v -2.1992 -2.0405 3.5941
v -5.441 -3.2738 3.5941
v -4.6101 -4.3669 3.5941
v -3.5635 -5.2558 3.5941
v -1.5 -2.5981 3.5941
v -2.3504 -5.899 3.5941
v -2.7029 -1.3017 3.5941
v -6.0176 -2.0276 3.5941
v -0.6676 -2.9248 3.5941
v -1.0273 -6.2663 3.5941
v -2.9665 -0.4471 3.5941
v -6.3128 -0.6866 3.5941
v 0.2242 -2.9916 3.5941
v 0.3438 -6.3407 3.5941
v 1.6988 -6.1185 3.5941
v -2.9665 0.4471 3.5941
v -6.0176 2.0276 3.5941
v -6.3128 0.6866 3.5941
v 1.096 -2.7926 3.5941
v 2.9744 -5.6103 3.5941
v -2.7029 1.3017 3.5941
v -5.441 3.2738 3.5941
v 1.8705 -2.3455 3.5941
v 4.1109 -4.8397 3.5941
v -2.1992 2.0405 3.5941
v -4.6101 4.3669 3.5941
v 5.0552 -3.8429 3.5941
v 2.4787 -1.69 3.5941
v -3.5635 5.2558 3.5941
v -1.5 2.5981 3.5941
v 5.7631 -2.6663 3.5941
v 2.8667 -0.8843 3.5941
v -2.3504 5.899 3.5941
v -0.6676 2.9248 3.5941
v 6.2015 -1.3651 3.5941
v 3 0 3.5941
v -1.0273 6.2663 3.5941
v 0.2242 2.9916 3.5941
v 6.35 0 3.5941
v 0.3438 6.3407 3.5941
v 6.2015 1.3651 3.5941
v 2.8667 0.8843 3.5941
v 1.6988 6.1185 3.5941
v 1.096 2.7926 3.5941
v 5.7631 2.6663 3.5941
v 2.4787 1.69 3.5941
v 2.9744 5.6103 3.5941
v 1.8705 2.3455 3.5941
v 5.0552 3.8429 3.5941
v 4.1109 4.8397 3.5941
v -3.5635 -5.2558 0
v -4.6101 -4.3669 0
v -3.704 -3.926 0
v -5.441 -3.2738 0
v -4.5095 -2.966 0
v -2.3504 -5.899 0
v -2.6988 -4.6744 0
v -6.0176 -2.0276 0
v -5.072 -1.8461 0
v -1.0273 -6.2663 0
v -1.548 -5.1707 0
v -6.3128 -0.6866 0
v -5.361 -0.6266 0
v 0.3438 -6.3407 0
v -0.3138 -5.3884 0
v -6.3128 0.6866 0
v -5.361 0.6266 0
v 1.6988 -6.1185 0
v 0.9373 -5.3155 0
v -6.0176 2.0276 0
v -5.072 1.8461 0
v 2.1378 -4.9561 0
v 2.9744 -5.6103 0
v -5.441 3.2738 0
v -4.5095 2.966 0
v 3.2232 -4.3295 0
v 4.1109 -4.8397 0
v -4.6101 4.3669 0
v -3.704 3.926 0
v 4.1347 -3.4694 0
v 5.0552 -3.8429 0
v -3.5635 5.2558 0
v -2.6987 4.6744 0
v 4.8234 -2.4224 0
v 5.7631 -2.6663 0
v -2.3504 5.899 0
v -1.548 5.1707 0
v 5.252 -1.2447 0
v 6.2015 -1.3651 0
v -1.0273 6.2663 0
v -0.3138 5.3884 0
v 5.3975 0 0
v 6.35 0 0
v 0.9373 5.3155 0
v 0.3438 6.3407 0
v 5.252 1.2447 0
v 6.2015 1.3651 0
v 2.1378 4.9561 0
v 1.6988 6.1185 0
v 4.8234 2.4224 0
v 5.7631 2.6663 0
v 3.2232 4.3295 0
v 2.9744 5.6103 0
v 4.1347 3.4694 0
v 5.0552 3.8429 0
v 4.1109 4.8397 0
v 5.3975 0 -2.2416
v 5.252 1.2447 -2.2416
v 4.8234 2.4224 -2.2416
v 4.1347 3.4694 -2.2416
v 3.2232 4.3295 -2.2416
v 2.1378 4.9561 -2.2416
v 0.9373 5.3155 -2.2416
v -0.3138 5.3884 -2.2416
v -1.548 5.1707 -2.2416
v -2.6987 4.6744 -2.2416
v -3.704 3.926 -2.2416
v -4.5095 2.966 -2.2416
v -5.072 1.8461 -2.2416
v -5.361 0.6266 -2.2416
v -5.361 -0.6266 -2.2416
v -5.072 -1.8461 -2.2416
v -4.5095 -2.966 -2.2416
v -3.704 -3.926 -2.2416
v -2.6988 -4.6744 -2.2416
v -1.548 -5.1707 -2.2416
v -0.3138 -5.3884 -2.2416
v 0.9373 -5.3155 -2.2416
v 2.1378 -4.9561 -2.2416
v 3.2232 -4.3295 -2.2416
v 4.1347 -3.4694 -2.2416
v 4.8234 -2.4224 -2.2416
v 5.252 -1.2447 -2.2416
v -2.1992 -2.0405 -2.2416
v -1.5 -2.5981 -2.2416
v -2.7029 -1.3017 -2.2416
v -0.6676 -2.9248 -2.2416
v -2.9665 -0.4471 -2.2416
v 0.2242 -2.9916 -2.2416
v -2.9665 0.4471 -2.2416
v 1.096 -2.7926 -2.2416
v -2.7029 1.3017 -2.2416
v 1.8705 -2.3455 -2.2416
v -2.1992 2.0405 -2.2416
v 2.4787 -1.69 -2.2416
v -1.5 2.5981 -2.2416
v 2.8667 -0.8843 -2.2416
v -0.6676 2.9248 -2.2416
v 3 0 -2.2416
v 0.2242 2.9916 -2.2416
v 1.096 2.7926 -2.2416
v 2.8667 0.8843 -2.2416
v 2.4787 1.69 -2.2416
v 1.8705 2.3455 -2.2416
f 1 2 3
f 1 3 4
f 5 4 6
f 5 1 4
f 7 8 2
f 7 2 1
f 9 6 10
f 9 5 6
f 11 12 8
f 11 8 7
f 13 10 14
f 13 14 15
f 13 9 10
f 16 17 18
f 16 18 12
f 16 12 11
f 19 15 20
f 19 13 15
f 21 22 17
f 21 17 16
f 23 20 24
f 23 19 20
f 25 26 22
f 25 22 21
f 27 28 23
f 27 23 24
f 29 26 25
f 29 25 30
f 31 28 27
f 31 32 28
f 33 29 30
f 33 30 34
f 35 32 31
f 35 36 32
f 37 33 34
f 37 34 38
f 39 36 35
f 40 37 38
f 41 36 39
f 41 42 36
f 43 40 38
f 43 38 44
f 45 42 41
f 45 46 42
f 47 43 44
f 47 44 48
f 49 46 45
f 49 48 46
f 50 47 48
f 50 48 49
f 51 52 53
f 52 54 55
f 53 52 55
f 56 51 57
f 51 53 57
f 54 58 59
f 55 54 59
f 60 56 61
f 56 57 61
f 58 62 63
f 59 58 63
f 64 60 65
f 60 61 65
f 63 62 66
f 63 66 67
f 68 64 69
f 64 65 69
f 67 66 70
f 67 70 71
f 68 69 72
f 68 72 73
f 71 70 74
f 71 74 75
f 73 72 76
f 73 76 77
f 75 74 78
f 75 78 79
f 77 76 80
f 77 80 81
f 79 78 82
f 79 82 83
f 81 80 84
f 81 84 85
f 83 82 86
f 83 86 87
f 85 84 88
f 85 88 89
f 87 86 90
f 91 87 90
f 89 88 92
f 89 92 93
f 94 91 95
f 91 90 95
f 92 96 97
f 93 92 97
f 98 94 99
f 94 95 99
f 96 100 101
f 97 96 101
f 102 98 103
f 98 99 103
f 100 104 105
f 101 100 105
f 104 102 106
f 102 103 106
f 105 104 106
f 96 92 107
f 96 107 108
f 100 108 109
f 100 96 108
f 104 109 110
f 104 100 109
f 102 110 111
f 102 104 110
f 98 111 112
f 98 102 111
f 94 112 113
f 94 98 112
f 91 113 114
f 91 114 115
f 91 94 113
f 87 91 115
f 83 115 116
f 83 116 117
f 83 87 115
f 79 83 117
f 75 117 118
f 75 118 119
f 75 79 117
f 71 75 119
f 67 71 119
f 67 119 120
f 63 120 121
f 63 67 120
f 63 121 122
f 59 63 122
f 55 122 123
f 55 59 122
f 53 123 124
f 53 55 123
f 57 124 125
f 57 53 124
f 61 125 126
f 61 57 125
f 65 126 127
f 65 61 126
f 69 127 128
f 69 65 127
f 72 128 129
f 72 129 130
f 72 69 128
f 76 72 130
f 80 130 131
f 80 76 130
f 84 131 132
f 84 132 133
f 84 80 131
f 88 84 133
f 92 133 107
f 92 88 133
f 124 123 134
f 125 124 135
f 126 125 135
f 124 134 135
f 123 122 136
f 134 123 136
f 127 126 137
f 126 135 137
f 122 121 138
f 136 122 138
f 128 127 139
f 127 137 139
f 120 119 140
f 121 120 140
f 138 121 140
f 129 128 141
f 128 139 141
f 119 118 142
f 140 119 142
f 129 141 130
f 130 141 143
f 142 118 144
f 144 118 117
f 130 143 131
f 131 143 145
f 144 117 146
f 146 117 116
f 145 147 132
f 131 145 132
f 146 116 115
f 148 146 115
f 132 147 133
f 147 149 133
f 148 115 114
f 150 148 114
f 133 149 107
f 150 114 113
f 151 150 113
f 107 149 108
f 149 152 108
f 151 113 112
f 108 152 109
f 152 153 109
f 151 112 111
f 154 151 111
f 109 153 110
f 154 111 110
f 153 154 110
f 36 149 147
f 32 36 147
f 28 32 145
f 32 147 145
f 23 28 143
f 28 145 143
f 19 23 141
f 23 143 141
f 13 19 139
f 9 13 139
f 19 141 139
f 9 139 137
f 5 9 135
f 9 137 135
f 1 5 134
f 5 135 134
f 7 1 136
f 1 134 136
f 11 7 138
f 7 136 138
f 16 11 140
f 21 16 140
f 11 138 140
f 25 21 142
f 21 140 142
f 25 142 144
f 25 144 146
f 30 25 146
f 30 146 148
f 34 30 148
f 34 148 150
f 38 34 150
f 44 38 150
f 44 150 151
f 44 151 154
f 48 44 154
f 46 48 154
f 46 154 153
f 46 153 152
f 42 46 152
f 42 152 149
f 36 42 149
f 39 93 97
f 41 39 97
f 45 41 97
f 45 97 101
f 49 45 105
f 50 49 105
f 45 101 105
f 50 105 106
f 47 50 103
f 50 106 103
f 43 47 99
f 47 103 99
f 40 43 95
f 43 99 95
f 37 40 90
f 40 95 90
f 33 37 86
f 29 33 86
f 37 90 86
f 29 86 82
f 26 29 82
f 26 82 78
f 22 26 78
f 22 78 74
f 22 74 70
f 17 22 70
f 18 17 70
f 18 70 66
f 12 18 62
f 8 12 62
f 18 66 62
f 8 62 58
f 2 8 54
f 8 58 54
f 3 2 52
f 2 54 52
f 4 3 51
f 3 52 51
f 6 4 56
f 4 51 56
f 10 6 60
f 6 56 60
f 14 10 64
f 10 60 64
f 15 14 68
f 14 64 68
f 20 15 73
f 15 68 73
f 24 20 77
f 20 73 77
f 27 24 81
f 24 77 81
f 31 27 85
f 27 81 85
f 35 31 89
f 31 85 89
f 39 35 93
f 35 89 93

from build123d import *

# Parameters (mm, degrees)
F0_R     = 12.7
F1_DEPTH = 7.1882
F2_R     = 10.795
F3_DEPTH = 4.4831
F4_R     = 6
F5_DEPTH = 25.4
F6_SCALE = 0.5


with BuildPart() as f1:
    # F0 (on Top) → F1 (new body)
    with BuildSketch(Plane.XY):
        Circle(F0_R)
    extrude(amount=F1_DEPTH)

    # F2 (on face) → F3 (join)
    with BuildSketch(Plane.XY):
        Circle(F2_R)
    extrude(amount=-F3_DEPTH)

    # F4 (on face) → F5 (cut)
    with BuildSketch(Plane(origin=(0, 0, -4.4831), x_dir=(1, 0, 0), z_dir=(0, 0, -1))):
        Circle(F4_R)
    extrude(amount=-F5_DEPTH, mode=Mode.SUBTRACT)


with BuildPart() as f1_1:
    # F6: moved
    add(f1.part.scale(F6_SCALE))


solid = f1_1.part
